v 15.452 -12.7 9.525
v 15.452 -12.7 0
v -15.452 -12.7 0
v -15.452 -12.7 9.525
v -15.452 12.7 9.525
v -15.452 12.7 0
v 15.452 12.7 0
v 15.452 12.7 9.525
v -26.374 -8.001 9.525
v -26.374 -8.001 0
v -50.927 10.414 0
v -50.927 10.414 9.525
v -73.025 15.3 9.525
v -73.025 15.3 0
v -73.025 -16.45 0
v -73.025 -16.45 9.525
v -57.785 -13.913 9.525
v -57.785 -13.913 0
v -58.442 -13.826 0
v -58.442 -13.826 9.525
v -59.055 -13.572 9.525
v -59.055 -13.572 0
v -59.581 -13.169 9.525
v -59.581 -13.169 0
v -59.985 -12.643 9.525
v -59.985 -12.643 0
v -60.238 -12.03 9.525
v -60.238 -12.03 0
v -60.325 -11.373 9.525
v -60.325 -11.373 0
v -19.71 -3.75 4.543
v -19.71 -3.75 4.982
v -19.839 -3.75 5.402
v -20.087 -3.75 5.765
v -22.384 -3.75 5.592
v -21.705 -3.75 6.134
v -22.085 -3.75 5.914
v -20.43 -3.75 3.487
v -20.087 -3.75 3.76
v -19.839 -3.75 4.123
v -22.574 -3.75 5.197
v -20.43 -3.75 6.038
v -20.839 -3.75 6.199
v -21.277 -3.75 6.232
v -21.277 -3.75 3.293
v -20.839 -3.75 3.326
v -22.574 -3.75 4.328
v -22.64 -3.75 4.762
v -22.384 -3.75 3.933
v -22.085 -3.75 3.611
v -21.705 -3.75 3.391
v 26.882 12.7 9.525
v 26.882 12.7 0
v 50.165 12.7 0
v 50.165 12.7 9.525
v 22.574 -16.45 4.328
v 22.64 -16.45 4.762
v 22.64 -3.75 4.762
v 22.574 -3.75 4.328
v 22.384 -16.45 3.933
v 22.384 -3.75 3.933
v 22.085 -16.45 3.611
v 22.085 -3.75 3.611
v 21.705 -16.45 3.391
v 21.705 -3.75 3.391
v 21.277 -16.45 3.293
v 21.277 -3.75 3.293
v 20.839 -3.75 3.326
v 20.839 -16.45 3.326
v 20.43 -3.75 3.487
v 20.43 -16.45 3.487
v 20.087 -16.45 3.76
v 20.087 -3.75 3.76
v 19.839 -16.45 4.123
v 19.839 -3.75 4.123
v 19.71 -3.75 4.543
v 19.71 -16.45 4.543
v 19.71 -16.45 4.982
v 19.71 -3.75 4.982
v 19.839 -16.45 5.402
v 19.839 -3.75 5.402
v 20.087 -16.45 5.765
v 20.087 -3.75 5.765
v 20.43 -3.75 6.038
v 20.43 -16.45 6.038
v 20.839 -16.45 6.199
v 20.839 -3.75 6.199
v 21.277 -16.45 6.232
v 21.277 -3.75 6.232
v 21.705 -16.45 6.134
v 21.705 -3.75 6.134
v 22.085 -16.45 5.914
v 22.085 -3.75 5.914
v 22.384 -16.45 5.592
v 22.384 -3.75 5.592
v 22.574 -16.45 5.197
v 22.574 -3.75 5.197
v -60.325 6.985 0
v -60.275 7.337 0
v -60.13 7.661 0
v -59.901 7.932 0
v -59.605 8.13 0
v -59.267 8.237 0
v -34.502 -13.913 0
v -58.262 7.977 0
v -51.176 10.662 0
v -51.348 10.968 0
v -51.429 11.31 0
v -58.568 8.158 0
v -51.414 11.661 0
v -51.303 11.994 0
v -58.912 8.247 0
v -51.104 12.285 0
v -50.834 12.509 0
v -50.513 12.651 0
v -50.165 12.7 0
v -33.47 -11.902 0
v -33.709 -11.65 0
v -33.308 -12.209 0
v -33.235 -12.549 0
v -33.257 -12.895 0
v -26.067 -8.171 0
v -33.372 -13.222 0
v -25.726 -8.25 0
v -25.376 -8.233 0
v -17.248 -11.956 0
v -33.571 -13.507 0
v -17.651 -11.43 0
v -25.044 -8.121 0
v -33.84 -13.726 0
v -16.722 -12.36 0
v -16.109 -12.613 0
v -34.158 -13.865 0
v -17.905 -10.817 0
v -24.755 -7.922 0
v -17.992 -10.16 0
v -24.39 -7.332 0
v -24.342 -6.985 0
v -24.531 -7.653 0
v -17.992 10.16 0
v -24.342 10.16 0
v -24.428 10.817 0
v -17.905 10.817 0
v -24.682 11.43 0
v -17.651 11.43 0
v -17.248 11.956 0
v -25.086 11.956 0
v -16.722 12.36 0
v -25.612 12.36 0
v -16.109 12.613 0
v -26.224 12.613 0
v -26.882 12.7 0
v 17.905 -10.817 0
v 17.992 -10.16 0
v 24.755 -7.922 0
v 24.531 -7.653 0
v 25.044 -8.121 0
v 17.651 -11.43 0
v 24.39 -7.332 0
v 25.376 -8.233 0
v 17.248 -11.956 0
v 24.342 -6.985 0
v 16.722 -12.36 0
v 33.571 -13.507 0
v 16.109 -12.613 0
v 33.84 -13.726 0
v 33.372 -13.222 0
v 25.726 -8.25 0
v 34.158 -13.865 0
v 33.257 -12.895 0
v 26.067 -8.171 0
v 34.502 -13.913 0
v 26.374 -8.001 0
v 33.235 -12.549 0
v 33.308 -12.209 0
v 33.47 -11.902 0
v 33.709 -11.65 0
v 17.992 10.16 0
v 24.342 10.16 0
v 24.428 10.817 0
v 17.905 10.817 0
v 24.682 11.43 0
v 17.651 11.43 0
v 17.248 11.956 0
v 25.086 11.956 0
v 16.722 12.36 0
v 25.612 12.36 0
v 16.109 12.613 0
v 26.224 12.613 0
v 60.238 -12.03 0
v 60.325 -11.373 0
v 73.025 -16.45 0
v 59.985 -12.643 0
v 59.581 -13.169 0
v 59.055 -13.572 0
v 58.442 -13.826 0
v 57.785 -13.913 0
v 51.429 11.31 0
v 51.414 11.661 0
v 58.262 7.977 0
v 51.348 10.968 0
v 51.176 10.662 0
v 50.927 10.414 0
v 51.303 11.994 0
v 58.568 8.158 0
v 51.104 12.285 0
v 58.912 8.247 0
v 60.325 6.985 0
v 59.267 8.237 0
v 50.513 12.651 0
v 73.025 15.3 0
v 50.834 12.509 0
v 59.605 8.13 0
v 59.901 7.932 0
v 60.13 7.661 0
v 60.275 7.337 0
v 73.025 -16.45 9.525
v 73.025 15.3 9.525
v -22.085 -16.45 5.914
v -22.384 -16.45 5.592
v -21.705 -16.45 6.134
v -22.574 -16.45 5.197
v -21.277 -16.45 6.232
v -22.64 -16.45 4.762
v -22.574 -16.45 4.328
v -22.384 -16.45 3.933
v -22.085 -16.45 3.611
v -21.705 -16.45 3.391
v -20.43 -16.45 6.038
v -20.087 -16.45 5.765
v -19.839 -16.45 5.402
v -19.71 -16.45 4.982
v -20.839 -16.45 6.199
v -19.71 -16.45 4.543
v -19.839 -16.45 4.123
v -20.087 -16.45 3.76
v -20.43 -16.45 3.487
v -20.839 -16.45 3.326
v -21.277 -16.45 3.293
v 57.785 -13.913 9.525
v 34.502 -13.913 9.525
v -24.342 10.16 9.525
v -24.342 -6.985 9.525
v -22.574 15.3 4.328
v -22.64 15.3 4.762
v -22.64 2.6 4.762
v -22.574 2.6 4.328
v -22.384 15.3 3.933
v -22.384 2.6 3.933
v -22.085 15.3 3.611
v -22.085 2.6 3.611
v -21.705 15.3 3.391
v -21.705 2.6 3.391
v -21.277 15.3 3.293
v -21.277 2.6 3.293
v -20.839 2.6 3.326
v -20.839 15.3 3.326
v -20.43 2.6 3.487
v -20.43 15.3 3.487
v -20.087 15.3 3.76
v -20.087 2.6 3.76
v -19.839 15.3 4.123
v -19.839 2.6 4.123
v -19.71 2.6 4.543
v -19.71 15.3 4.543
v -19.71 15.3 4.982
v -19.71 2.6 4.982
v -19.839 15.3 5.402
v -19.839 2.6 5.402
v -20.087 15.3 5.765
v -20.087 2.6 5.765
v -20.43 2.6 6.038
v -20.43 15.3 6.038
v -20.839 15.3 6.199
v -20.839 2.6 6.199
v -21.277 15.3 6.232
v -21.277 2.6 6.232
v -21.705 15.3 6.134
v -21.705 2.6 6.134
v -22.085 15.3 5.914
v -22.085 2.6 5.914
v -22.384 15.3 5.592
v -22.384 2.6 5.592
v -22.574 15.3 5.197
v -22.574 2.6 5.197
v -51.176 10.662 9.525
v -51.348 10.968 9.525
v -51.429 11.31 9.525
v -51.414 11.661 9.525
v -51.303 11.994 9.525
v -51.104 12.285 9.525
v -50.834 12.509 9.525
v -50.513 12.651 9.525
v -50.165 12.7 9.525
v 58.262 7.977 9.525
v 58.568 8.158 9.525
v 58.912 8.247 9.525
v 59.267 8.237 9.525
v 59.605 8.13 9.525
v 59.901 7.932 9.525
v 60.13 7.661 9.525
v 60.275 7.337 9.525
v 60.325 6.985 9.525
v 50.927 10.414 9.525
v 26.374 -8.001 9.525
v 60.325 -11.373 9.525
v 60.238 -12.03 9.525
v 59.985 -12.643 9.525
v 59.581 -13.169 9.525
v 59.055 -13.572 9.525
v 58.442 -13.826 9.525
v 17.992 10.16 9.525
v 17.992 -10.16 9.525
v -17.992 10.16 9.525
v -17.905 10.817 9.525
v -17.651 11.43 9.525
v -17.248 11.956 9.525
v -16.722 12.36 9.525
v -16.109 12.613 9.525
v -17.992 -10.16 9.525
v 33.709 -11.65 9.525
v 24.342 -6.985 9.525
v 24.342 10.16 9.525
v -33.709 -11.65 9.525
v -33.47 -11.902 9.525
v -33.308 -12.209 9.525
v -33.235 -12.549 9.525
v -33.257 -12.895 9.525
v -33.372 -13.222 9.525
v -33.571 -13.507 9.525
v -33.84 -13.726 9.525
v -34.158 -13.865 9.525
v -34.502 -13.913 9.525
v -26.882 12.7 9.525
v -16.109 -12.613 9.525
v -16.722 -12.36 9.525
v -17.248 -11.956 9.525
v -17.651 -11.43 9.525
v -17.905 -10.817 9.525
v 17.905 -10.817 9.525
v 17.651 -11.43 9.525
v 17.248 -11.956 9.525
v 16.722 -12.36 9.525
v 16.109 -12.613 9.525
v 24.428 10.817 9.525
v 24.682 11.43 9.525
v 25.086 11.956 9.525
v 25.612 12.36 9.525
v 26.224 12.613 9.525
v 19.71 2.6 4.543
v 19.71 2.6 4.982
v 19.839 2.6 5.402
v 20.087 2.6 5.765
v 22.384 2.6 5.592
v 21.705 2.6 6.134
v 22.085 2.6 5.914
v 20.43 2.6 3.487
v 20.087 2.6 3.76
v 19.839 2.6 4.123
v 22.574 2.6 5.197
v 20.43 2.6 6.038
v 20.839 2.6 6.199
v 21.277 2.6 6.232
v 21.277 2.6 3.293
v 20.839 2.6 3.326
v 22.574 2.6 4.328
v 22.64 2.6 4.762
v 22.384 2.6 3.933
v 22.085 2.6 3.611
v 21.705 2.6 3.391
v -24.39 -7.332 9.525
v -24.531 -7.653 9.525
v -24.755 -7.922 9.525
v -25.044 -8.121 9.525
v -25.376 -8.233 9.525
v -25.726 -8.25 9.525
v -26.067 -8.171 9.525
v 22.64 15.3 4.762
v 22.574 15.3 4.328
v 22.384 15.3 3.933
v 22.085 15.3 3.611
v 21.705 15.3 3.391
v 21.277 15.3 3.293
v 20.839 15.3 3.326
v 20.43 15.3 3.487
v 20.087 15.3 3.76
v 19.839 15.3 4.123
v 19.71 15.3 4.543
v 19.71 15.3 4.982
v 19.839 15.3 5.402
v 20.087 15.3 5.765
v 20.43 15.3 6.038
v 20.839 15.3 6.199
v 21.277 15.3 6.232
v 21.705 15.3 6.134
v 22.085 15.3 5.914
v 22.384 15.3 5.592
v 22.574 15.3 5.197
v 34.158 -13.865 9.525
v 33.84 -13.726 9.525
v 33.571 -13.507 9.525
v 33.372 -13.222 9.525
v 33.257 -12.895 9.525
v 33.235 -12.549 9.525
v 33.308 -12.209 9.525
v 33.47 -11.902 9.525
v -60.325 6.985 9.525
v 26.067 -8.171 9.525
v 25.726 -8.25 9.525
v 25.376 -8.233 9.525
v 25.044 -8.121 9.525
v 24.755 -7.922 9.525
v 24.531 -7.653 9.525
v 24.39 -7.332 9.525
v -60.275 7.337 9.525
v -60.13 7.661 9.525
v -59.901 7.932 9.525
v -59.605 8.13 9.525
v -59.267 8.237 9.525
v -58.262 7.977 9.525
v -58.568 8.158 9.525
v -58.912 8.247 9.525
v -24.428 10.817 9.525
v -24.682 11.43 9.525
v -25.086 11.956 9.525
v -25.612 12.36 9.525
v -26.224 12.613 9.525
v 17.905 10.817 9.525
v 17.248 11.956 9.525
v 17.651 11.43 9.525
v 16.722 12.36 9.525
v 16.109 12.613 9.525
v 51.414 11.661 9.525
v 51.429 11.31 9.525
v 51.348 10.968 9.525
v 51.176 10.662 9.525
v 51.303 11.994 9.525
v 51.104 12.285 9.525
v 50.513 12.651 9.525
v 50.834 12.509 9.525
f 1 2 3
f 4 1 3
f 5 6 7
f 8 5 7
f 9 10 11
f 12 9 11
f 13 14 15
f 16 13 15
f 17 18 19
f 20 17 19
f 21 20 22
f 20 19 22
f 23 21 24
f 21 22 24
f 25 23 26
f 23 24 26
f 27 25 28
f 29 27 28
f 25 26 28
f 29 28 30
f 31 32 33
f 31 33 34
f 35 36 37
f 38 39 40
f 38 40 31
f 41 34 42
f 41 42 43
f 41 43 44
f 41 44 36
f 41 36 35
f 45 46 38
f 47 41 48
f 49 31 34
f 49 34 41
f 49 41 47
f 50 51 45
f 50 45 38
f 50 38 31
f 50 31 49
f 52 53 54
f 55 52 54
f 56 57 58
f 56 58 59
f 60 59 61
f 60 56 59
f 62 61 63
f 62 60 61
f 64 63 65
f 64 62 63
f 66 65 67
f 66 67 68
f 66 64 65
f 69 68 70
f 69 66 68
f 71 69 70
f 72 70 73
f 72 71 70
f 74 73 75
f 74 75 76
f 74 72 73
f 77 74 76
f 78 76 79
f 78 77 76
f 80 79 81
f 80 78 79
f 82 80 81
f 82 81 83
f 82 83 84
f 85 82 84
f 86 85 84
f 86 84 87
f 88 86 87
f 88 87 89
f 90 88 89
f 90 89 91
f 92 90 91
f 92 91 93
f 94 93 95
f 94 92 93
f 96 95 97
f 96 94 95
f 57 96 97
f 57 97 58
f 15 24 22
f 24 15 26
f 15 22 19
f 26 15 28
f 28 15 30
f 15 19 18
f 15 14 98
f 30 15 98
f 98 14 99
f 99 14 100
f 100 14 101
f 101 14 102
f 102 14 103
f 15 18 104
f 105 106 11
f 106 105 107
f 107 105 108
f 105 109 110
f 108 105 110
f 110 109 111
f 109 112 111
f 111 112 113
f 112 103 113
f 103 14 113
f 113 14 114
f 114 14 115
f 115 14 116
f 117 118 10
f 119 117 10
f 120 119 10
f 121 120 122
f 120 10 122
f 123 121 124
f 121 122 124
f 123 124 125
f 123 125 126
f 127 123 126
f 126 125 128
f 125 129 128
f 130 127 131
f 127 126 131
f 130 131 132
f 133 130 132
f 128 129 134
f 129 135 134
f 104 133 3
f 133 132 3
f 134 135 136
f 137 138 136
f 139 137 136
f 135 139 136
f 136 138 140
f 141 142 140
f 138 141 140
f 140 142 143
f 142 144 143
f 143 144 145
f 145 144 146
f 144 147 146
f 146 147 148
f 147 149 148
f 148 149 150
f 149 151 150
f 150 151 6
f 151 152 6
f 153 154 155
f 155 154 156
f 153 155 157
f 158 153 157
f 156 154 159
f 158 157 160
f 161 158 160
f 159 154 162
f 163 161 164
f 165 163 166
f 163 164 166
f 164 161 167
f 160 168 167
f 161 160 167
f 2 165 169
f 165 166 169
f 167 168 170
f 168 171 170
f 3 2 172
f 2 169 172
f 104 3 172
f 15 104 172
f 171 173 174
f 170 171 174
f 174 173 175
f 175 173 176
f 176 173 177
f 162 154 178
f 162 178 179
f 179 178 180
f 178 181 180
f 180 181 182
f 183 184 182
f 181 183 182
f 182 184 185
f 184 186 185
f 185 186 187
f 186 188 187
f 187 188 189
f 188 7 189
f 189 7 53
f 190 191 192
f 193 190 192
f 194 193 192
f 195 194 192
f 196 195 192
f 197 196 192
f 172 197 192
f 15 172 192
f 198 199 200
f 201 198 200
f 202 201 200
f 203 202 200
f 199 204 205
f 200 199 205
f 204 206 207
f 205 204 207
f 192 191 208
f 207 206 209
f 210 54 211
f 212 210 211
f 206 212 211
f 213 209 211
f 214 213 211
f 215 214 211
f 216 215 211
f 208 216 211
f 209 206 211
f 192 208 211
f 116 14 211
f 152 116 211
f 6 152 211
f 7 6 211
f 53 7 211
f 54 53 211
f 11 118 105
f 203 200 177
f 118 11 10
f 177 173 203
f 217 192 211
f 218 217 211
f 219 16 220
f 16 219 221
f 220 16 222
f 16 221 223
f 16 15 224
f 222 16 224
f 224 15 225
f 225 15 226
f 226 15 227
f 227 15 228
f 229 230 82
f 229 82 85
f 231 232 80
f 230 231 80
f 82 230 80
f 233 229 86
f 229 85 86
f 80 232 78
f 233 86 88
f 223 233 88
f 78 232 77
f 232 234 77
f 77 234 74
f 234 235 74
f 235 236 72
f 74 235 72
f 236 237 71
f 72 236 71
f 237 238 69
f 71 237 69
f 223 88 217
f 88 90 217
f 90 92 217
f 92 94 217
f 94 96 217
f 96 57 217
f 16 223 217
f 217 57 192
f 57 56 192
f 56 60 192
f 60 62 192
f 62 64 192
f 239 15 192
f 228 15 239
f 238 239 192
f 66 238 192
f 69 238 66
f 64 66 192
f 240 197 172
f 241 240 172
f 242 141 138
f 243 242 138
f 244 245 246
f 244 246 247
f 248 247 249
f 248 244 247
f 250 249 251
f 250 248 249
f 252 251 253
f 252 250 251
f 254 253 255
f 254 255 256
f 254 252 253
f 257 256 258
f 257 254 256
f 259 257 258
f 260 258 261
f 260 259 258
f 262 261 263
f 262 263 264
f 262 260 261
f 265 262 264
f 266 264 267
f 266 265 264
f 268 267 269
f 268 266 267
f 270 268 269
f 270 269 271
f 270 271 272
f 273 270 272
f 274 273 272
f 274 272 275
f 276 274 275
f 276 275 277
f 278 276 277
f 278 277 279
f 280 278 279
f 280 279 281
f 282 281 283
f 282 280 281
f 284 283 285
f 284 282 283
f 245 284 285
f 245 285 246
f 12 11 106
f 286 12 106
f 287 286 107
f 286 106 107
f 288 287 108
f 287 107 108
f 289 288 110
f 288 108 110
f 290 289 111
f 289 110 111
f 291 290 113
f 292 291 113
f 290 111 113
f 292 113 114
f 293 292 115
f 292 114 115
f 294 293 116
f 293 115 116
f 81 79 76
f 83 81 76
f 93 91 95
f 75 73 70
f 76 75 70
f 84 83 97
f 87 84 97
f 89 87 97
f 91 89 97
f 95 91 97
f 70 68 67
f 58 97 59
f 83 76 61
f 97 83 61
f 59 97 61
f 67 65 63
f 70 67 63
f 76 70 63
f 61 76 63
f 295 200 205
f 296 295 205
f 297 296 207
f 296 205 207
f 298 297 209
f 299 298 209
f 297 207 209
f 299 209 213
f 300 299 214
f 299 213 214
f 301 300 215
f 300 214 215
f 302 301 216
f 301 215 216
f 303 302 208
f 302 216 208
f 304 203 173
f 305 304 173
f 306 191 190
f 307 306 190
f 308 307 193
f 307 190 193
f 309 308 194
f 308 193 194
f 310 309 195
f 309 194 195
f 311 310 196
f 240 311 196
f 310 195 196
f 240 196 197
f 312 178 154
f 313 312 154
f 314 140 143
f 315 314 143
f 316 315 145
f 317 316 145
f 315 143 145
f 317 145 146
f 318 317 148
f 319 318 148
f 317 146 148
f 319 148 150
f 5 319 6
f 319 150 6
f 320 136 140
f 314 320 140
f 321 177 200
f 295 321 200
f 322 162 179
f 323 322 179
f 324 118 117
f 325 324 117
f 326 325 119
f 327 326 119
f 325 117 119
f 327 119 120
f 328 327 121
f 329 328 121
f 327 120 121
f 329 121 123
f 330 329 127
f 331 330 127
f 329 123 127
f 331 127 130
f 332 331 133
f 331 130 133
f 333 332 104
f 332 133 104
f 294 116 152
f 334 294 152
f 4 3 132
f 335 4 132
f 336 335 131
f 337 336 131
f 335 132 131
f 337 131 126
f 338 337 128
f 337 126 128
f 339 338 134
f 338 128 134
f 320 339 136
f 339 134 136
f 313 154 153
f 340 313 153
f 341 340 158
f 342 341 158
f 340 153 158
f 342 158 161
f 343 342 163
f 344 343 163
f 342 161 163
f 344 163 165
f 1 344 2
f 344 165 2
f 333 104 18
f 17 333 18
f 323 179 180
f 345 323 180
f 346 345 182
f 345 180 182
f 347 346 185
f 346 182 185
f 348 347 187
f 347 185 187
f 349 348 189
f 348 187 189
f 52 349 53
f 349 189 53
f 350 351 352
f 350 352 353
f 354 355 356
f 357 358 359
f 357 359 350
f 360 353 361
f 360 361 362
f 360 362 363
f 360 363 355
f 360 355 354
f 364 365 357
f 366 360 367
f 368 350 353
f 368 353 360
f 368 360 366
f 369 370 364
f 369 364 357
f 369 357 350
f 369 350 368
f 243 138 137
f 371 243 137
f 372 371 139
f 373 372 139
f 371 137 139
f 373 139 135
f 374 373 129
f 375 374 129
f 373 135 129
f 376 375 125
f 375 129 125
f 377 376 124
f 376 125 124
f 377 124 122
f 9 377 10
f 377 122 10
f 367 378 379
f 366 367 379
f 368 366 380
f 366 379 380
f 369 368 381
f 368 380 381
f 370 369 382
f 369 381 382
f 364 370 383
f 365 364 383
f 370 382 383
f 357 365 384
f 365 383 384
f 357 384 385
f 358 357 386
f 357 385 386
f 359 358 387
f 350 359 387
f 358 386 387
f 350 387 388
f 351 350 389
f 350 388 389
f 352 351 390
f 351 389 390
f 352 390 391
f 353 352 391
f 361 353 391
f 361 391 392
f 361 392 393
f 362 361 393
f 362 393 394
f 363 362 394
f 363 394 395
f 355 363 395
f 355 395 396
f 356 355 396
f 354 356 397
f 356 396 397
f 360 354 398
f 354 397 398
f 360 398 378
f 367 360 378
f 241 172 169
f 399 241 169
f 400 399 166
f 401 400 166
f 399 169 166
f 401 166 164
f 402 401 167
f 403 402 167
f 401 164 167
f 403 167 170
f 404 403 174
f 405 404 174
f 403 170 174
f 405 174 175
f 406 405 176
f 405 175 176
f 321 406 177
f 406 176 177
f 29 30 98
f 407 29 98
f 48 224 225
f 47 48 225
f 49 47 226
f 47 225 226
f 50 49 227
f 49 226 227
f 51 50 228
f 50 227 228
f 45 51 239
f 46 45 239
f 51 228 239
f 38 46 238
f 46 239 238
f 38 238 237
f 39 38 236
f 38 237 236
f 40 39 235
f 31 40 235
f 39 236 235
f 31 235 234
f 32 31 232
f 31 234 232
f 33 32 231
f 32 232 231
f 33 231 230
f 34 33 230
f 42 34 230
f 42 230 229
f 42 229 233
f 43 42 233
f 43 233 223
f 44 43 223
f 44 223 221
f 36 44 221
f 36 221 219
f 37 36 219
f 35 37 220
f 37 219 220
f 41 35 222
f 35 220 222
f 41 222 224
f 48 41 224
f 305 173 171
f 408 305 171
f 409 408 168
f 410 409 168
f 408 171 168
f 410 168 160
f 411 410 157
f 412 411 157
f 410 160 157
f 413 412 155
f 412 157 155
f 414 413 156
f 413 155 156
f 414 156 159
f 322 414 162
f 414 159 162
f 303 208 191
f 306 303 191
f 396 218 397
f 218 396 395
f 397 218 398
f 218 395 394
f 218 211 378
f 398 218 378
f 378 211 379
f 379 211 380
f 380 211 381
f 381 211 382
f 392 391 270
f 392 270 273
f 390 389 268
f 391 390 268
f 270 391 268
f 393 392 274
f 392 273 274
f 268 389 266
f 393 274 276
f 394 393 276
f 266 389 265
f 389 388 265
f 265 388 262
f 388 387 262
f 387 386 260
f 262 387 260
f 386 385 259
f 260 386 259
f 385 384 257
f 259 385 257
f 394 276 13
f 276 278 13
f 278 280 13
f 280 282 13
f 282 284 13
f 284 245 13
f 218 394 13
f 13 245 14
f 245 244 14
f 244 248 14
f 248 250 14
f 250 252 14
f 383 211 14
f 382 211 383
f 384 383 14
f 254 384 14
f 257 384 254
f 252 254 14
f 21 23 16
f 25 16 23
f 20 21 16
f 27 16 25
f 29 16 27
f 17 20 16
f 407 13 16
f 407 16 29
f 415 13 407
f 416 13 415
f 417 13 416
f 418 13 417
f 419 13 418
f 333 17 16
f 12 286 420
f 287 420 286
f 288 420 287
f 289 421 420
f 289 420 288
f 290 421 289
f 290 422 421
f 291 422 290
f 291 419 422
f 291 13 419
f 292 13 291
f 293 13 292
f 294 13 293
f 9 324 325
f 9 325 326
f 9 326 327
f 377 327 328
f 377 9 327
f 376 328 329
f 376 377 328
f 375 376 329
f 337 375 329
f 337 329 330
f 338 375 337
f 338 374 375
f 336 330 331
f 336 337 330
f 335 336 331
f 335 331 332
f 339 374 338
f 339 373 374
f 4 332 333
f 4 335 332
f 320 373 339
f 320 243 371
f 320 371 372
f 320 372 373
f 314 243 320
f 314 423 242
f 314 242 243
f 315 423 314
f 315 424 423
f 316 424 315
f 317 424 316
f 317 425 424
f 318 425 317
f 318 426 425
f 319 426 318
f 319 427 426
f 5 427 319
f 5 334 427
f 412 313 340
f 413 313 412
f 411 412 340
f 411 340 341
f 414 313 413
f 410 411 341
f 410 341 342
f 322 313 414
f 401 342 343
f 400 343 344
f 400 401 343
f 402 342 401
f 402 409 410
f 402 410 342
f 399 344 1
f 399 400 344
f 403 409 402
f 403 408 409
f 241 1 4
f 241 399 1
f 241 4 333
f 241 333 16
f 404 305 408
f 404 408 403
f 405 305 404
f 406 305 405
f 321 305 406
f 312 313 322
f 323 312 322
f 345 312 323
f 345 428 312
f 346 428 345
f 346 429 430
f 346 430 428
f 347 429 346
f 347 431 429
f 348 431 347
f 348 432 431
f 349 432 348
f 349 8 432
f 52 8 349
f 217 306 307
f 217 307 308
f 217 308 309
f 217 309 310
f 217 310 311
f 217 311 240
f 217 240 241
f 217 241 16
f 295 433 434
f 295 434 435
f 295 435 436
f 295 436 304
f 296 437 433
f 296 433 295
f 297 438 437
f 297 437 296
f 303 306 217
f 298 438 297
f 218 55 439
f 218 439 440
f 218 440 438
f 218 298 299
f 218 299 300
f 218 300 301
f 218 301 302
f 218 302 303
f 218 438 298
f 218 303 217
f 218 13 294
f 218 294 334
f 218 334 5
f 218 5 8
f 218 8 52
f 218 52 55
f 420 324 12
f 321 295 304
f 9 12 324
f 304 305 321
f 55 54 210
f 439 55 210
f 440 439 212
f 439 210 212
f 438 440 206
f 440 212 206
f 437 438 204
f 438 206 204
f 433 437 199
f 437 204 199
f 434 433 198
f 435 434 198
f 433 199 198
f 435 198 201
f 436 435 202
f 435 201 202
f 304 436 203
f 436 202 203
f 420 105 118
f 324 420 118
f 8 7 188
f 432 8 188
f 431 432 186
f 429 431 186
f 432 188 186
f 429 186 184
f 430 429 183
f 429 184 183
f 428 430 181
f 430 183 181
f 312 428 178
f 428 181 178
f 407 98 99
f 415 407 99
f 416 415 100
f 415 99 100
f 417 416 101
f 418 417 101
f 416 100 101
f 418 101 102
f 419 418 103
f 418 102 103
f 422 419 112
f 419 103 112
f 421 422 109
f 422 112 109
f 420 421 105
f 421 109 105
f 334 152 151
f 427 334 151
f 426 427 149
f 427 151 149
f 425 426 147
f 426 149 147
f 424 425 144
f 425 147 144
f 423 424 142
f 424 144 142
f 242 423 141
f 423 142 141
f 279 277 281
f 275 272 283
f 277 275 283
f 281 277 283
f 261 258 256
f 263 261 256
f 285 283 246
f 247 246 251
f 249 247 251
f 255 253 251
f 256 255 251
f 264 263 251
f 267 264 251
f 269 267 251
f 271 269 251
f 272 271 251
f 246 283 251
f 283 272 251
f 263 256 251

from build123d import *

# Parameters (mm, degrees)
BOSS_EXTRUDE2_DEPTH                        = 9.525
SKETCH4_R                                  = 1.4732
CUT_EXTRUDE2_DEPTH                         = 12.7
MIRROR2_AT_THE_SECOND_PLANE_COPY_1_SKETC_R = 1.4732
MIRROR2_AT_THE_SECOND_PLANE_COPY_1_DEPTH   = 12.7


with BuildPart() as part:
    # Sketch2 → Boss-Extrude2 (new body)
    with BuildSketch(Plane.XY):
        Polygon((-63.5, 15.299999878), (-73.025, 15.299999878), (-73.025, -16.450000122), (-63.5, -16.450000122), (-21.166666667, -16.450000122), (0, -16.450000122), (73.025, -16.450000122), (73.025, 15.299999878), (-21.166666667, 15.299999878), (-24.341666667, 15.299999878), align=None)
        with BuildLine():
            ThreePointArc((-57.785, -13.912500244), (-59.581051224, -13.168551468), (-60.325, -11.372500244))
            Line((-60.325, -11.372500244), (-60.325, 6.985))
            ThreePointArc((-60.325, 6.985), (-59.605365306, 8.129551454), (-58.262010976, 7.977002221))
            Line((-58.262010976, 7.977002221), (-33.708677642, -11.650498023))
            ThreePointArc((-33.708677642, -11.650498023), (-33.303179533, -13.062653299), (-34.501666667, -13.912500244))
            Line((-34.501666667, -13.912500244), (-57.785, -13.912500244))
        make_face(mode=Mode.SUBTRACT)
        with BuildLine():
            ThreePointArc((60.325, -11.372500244), (59.581051224, -13.168551468), (57.785, -13.912500244))
            Line((57.785, -13.912500244), (34.501666667, -13.912500244))
            ThreePointArc((34.501666667, -13.912500244), (33.303179533, -13.062653299), (33.708677642, -11.650498023))
            Line((33.708677642, -11.650498023), (58.262010976, 7.977002221))
            ThreePointArc((58.262010976, 7.977002221), (59.605365306, 8.129551454), (60.325, 6.985))
            Line((60.325, 6.985), (60.325, -11.372500244))
        make_face(mode=Mode.SUBTRACT)
        with BuildLine():
            Line((-26.373666667, -8.001), (-50.927, 10.414))
            ThreePointArc((-50.927, 10.414), (-51.369827789, 11.831609263), (-50.165, 12.7))
            Line((-50.165, 12.7), (-26.881666667, 12.7))
            ThreePointArc((-26.881666667, 12.7), (-25.085615442, 11.956051224), (-24.341666667, 10.16))
            Line((-24.341666667, 10.16), (-24.341666667, -6.985))
            ThreePointArc((-24.341666667, -6.985), (-25.0437054, -8.120922533), (-26.373666667, -8.001))
        make_face(mode=Mode.SUBTRACT)
        with BuildLine():
            ThreePointArc((-17.991666667, 10.16), (-17.247717891, 11.956051224), (-15.451666667, 12.7))
            Line((-15.451666667, 12.7), (15.451666667, 12.7))
            ThreePointArc((15.451666667, 12.7), (17.247717891, 11.956051224), (17.991666667, 10.16))
            Line((17.991666667, 10.16), (17.991666667, -10.16))
            ThreePointArc((17.991666667, -10.16), (17.247717891, -11.956051224), (15.451666667, -12.7))
            Line((15.451666667, -12.7), (-15.451666667, -12.7))
            ThreePointArc((-15.451666667, -12.7), (-17.247717891, -11.956051224), (-17.991666667, -10.16))
            Line((-17.991666667, -10.16), (-17.991666667, 10.16))
        make_face(mode=Mode.SUBTRACT)
        with BuildLine():
            Line((24.341666667, -6.985), (24.341666667, 10.16))
            ThreePointArc((24.341666667, 10.16), (25.085615442, 11.956051224), (26.881666667, 12.7))
            Line((26.881666667, 12.7), (50.165, 12.7))
            ThreePointArc((50.165, 12.7), (51.369827789, 11.831609263), (50.927, 10.414))
            Line((50.927, 10.414), (26.373666667, -8.001))
            ThreePointArc((26.373666667, -8.001), (25.0437054, -8.120922533), (24.341666667, -6.985))
        make_face(mode=Mode.SUBTRACT)
    extrude(amount=BOSS_EXTRUDE2_DEPTH)

    # Sketch4 → Cut-Extrude2 (cut)
    with BuildSketch(Plane(origin=(0, 15.299999878, 0), x_dir=(1, 0, 0), z_dir=(0, 1, 0))):
        with Locations((21.166666667, -4.7625)):
            Circle(SKETCH4_R)
    cut_extrude2 = extrude(amount=-CUT_EXTRUDE2_DEPTH, mode=Mode.SUBTRACT)

    # Mirror2: Cut-Extrude2 across plane
    add(cut_extrude2.mirror(Plane.ZX.offset(-0.575000122)), mode=Mode.SUBTRACT)

    # Mirror2 at the second plane: Cut-Extrude2 across plane
    add(cut_extrude2.mirror(Plane(origin=(0, 0, 0), x_dir=(0, 0, 1), z_dir=(1, 0, 0))), mode=Mode.SUBTRACT)

    # Mirror2 at the second plane copy 1 sketc → Mirror2 at the second plane copy 1 (cut)
    with BuildSketch(Plane(origin=(0, -16.450000122, 0), x_dir=(-1, 0, 0), z_dir=(0, -1, 0))):
        with Locations((21.166666667, -4.7625)):
            Circle(MIRROR2_AT_THE_SECOND_PLANE_COPY_1_SKETC_R)
    extrude(amount=-MIRROR2_AT_THE_SECOND_PLANE_COPY_1_DEPTH, mode=Mode.SUBTRACT)


solid = part.part
